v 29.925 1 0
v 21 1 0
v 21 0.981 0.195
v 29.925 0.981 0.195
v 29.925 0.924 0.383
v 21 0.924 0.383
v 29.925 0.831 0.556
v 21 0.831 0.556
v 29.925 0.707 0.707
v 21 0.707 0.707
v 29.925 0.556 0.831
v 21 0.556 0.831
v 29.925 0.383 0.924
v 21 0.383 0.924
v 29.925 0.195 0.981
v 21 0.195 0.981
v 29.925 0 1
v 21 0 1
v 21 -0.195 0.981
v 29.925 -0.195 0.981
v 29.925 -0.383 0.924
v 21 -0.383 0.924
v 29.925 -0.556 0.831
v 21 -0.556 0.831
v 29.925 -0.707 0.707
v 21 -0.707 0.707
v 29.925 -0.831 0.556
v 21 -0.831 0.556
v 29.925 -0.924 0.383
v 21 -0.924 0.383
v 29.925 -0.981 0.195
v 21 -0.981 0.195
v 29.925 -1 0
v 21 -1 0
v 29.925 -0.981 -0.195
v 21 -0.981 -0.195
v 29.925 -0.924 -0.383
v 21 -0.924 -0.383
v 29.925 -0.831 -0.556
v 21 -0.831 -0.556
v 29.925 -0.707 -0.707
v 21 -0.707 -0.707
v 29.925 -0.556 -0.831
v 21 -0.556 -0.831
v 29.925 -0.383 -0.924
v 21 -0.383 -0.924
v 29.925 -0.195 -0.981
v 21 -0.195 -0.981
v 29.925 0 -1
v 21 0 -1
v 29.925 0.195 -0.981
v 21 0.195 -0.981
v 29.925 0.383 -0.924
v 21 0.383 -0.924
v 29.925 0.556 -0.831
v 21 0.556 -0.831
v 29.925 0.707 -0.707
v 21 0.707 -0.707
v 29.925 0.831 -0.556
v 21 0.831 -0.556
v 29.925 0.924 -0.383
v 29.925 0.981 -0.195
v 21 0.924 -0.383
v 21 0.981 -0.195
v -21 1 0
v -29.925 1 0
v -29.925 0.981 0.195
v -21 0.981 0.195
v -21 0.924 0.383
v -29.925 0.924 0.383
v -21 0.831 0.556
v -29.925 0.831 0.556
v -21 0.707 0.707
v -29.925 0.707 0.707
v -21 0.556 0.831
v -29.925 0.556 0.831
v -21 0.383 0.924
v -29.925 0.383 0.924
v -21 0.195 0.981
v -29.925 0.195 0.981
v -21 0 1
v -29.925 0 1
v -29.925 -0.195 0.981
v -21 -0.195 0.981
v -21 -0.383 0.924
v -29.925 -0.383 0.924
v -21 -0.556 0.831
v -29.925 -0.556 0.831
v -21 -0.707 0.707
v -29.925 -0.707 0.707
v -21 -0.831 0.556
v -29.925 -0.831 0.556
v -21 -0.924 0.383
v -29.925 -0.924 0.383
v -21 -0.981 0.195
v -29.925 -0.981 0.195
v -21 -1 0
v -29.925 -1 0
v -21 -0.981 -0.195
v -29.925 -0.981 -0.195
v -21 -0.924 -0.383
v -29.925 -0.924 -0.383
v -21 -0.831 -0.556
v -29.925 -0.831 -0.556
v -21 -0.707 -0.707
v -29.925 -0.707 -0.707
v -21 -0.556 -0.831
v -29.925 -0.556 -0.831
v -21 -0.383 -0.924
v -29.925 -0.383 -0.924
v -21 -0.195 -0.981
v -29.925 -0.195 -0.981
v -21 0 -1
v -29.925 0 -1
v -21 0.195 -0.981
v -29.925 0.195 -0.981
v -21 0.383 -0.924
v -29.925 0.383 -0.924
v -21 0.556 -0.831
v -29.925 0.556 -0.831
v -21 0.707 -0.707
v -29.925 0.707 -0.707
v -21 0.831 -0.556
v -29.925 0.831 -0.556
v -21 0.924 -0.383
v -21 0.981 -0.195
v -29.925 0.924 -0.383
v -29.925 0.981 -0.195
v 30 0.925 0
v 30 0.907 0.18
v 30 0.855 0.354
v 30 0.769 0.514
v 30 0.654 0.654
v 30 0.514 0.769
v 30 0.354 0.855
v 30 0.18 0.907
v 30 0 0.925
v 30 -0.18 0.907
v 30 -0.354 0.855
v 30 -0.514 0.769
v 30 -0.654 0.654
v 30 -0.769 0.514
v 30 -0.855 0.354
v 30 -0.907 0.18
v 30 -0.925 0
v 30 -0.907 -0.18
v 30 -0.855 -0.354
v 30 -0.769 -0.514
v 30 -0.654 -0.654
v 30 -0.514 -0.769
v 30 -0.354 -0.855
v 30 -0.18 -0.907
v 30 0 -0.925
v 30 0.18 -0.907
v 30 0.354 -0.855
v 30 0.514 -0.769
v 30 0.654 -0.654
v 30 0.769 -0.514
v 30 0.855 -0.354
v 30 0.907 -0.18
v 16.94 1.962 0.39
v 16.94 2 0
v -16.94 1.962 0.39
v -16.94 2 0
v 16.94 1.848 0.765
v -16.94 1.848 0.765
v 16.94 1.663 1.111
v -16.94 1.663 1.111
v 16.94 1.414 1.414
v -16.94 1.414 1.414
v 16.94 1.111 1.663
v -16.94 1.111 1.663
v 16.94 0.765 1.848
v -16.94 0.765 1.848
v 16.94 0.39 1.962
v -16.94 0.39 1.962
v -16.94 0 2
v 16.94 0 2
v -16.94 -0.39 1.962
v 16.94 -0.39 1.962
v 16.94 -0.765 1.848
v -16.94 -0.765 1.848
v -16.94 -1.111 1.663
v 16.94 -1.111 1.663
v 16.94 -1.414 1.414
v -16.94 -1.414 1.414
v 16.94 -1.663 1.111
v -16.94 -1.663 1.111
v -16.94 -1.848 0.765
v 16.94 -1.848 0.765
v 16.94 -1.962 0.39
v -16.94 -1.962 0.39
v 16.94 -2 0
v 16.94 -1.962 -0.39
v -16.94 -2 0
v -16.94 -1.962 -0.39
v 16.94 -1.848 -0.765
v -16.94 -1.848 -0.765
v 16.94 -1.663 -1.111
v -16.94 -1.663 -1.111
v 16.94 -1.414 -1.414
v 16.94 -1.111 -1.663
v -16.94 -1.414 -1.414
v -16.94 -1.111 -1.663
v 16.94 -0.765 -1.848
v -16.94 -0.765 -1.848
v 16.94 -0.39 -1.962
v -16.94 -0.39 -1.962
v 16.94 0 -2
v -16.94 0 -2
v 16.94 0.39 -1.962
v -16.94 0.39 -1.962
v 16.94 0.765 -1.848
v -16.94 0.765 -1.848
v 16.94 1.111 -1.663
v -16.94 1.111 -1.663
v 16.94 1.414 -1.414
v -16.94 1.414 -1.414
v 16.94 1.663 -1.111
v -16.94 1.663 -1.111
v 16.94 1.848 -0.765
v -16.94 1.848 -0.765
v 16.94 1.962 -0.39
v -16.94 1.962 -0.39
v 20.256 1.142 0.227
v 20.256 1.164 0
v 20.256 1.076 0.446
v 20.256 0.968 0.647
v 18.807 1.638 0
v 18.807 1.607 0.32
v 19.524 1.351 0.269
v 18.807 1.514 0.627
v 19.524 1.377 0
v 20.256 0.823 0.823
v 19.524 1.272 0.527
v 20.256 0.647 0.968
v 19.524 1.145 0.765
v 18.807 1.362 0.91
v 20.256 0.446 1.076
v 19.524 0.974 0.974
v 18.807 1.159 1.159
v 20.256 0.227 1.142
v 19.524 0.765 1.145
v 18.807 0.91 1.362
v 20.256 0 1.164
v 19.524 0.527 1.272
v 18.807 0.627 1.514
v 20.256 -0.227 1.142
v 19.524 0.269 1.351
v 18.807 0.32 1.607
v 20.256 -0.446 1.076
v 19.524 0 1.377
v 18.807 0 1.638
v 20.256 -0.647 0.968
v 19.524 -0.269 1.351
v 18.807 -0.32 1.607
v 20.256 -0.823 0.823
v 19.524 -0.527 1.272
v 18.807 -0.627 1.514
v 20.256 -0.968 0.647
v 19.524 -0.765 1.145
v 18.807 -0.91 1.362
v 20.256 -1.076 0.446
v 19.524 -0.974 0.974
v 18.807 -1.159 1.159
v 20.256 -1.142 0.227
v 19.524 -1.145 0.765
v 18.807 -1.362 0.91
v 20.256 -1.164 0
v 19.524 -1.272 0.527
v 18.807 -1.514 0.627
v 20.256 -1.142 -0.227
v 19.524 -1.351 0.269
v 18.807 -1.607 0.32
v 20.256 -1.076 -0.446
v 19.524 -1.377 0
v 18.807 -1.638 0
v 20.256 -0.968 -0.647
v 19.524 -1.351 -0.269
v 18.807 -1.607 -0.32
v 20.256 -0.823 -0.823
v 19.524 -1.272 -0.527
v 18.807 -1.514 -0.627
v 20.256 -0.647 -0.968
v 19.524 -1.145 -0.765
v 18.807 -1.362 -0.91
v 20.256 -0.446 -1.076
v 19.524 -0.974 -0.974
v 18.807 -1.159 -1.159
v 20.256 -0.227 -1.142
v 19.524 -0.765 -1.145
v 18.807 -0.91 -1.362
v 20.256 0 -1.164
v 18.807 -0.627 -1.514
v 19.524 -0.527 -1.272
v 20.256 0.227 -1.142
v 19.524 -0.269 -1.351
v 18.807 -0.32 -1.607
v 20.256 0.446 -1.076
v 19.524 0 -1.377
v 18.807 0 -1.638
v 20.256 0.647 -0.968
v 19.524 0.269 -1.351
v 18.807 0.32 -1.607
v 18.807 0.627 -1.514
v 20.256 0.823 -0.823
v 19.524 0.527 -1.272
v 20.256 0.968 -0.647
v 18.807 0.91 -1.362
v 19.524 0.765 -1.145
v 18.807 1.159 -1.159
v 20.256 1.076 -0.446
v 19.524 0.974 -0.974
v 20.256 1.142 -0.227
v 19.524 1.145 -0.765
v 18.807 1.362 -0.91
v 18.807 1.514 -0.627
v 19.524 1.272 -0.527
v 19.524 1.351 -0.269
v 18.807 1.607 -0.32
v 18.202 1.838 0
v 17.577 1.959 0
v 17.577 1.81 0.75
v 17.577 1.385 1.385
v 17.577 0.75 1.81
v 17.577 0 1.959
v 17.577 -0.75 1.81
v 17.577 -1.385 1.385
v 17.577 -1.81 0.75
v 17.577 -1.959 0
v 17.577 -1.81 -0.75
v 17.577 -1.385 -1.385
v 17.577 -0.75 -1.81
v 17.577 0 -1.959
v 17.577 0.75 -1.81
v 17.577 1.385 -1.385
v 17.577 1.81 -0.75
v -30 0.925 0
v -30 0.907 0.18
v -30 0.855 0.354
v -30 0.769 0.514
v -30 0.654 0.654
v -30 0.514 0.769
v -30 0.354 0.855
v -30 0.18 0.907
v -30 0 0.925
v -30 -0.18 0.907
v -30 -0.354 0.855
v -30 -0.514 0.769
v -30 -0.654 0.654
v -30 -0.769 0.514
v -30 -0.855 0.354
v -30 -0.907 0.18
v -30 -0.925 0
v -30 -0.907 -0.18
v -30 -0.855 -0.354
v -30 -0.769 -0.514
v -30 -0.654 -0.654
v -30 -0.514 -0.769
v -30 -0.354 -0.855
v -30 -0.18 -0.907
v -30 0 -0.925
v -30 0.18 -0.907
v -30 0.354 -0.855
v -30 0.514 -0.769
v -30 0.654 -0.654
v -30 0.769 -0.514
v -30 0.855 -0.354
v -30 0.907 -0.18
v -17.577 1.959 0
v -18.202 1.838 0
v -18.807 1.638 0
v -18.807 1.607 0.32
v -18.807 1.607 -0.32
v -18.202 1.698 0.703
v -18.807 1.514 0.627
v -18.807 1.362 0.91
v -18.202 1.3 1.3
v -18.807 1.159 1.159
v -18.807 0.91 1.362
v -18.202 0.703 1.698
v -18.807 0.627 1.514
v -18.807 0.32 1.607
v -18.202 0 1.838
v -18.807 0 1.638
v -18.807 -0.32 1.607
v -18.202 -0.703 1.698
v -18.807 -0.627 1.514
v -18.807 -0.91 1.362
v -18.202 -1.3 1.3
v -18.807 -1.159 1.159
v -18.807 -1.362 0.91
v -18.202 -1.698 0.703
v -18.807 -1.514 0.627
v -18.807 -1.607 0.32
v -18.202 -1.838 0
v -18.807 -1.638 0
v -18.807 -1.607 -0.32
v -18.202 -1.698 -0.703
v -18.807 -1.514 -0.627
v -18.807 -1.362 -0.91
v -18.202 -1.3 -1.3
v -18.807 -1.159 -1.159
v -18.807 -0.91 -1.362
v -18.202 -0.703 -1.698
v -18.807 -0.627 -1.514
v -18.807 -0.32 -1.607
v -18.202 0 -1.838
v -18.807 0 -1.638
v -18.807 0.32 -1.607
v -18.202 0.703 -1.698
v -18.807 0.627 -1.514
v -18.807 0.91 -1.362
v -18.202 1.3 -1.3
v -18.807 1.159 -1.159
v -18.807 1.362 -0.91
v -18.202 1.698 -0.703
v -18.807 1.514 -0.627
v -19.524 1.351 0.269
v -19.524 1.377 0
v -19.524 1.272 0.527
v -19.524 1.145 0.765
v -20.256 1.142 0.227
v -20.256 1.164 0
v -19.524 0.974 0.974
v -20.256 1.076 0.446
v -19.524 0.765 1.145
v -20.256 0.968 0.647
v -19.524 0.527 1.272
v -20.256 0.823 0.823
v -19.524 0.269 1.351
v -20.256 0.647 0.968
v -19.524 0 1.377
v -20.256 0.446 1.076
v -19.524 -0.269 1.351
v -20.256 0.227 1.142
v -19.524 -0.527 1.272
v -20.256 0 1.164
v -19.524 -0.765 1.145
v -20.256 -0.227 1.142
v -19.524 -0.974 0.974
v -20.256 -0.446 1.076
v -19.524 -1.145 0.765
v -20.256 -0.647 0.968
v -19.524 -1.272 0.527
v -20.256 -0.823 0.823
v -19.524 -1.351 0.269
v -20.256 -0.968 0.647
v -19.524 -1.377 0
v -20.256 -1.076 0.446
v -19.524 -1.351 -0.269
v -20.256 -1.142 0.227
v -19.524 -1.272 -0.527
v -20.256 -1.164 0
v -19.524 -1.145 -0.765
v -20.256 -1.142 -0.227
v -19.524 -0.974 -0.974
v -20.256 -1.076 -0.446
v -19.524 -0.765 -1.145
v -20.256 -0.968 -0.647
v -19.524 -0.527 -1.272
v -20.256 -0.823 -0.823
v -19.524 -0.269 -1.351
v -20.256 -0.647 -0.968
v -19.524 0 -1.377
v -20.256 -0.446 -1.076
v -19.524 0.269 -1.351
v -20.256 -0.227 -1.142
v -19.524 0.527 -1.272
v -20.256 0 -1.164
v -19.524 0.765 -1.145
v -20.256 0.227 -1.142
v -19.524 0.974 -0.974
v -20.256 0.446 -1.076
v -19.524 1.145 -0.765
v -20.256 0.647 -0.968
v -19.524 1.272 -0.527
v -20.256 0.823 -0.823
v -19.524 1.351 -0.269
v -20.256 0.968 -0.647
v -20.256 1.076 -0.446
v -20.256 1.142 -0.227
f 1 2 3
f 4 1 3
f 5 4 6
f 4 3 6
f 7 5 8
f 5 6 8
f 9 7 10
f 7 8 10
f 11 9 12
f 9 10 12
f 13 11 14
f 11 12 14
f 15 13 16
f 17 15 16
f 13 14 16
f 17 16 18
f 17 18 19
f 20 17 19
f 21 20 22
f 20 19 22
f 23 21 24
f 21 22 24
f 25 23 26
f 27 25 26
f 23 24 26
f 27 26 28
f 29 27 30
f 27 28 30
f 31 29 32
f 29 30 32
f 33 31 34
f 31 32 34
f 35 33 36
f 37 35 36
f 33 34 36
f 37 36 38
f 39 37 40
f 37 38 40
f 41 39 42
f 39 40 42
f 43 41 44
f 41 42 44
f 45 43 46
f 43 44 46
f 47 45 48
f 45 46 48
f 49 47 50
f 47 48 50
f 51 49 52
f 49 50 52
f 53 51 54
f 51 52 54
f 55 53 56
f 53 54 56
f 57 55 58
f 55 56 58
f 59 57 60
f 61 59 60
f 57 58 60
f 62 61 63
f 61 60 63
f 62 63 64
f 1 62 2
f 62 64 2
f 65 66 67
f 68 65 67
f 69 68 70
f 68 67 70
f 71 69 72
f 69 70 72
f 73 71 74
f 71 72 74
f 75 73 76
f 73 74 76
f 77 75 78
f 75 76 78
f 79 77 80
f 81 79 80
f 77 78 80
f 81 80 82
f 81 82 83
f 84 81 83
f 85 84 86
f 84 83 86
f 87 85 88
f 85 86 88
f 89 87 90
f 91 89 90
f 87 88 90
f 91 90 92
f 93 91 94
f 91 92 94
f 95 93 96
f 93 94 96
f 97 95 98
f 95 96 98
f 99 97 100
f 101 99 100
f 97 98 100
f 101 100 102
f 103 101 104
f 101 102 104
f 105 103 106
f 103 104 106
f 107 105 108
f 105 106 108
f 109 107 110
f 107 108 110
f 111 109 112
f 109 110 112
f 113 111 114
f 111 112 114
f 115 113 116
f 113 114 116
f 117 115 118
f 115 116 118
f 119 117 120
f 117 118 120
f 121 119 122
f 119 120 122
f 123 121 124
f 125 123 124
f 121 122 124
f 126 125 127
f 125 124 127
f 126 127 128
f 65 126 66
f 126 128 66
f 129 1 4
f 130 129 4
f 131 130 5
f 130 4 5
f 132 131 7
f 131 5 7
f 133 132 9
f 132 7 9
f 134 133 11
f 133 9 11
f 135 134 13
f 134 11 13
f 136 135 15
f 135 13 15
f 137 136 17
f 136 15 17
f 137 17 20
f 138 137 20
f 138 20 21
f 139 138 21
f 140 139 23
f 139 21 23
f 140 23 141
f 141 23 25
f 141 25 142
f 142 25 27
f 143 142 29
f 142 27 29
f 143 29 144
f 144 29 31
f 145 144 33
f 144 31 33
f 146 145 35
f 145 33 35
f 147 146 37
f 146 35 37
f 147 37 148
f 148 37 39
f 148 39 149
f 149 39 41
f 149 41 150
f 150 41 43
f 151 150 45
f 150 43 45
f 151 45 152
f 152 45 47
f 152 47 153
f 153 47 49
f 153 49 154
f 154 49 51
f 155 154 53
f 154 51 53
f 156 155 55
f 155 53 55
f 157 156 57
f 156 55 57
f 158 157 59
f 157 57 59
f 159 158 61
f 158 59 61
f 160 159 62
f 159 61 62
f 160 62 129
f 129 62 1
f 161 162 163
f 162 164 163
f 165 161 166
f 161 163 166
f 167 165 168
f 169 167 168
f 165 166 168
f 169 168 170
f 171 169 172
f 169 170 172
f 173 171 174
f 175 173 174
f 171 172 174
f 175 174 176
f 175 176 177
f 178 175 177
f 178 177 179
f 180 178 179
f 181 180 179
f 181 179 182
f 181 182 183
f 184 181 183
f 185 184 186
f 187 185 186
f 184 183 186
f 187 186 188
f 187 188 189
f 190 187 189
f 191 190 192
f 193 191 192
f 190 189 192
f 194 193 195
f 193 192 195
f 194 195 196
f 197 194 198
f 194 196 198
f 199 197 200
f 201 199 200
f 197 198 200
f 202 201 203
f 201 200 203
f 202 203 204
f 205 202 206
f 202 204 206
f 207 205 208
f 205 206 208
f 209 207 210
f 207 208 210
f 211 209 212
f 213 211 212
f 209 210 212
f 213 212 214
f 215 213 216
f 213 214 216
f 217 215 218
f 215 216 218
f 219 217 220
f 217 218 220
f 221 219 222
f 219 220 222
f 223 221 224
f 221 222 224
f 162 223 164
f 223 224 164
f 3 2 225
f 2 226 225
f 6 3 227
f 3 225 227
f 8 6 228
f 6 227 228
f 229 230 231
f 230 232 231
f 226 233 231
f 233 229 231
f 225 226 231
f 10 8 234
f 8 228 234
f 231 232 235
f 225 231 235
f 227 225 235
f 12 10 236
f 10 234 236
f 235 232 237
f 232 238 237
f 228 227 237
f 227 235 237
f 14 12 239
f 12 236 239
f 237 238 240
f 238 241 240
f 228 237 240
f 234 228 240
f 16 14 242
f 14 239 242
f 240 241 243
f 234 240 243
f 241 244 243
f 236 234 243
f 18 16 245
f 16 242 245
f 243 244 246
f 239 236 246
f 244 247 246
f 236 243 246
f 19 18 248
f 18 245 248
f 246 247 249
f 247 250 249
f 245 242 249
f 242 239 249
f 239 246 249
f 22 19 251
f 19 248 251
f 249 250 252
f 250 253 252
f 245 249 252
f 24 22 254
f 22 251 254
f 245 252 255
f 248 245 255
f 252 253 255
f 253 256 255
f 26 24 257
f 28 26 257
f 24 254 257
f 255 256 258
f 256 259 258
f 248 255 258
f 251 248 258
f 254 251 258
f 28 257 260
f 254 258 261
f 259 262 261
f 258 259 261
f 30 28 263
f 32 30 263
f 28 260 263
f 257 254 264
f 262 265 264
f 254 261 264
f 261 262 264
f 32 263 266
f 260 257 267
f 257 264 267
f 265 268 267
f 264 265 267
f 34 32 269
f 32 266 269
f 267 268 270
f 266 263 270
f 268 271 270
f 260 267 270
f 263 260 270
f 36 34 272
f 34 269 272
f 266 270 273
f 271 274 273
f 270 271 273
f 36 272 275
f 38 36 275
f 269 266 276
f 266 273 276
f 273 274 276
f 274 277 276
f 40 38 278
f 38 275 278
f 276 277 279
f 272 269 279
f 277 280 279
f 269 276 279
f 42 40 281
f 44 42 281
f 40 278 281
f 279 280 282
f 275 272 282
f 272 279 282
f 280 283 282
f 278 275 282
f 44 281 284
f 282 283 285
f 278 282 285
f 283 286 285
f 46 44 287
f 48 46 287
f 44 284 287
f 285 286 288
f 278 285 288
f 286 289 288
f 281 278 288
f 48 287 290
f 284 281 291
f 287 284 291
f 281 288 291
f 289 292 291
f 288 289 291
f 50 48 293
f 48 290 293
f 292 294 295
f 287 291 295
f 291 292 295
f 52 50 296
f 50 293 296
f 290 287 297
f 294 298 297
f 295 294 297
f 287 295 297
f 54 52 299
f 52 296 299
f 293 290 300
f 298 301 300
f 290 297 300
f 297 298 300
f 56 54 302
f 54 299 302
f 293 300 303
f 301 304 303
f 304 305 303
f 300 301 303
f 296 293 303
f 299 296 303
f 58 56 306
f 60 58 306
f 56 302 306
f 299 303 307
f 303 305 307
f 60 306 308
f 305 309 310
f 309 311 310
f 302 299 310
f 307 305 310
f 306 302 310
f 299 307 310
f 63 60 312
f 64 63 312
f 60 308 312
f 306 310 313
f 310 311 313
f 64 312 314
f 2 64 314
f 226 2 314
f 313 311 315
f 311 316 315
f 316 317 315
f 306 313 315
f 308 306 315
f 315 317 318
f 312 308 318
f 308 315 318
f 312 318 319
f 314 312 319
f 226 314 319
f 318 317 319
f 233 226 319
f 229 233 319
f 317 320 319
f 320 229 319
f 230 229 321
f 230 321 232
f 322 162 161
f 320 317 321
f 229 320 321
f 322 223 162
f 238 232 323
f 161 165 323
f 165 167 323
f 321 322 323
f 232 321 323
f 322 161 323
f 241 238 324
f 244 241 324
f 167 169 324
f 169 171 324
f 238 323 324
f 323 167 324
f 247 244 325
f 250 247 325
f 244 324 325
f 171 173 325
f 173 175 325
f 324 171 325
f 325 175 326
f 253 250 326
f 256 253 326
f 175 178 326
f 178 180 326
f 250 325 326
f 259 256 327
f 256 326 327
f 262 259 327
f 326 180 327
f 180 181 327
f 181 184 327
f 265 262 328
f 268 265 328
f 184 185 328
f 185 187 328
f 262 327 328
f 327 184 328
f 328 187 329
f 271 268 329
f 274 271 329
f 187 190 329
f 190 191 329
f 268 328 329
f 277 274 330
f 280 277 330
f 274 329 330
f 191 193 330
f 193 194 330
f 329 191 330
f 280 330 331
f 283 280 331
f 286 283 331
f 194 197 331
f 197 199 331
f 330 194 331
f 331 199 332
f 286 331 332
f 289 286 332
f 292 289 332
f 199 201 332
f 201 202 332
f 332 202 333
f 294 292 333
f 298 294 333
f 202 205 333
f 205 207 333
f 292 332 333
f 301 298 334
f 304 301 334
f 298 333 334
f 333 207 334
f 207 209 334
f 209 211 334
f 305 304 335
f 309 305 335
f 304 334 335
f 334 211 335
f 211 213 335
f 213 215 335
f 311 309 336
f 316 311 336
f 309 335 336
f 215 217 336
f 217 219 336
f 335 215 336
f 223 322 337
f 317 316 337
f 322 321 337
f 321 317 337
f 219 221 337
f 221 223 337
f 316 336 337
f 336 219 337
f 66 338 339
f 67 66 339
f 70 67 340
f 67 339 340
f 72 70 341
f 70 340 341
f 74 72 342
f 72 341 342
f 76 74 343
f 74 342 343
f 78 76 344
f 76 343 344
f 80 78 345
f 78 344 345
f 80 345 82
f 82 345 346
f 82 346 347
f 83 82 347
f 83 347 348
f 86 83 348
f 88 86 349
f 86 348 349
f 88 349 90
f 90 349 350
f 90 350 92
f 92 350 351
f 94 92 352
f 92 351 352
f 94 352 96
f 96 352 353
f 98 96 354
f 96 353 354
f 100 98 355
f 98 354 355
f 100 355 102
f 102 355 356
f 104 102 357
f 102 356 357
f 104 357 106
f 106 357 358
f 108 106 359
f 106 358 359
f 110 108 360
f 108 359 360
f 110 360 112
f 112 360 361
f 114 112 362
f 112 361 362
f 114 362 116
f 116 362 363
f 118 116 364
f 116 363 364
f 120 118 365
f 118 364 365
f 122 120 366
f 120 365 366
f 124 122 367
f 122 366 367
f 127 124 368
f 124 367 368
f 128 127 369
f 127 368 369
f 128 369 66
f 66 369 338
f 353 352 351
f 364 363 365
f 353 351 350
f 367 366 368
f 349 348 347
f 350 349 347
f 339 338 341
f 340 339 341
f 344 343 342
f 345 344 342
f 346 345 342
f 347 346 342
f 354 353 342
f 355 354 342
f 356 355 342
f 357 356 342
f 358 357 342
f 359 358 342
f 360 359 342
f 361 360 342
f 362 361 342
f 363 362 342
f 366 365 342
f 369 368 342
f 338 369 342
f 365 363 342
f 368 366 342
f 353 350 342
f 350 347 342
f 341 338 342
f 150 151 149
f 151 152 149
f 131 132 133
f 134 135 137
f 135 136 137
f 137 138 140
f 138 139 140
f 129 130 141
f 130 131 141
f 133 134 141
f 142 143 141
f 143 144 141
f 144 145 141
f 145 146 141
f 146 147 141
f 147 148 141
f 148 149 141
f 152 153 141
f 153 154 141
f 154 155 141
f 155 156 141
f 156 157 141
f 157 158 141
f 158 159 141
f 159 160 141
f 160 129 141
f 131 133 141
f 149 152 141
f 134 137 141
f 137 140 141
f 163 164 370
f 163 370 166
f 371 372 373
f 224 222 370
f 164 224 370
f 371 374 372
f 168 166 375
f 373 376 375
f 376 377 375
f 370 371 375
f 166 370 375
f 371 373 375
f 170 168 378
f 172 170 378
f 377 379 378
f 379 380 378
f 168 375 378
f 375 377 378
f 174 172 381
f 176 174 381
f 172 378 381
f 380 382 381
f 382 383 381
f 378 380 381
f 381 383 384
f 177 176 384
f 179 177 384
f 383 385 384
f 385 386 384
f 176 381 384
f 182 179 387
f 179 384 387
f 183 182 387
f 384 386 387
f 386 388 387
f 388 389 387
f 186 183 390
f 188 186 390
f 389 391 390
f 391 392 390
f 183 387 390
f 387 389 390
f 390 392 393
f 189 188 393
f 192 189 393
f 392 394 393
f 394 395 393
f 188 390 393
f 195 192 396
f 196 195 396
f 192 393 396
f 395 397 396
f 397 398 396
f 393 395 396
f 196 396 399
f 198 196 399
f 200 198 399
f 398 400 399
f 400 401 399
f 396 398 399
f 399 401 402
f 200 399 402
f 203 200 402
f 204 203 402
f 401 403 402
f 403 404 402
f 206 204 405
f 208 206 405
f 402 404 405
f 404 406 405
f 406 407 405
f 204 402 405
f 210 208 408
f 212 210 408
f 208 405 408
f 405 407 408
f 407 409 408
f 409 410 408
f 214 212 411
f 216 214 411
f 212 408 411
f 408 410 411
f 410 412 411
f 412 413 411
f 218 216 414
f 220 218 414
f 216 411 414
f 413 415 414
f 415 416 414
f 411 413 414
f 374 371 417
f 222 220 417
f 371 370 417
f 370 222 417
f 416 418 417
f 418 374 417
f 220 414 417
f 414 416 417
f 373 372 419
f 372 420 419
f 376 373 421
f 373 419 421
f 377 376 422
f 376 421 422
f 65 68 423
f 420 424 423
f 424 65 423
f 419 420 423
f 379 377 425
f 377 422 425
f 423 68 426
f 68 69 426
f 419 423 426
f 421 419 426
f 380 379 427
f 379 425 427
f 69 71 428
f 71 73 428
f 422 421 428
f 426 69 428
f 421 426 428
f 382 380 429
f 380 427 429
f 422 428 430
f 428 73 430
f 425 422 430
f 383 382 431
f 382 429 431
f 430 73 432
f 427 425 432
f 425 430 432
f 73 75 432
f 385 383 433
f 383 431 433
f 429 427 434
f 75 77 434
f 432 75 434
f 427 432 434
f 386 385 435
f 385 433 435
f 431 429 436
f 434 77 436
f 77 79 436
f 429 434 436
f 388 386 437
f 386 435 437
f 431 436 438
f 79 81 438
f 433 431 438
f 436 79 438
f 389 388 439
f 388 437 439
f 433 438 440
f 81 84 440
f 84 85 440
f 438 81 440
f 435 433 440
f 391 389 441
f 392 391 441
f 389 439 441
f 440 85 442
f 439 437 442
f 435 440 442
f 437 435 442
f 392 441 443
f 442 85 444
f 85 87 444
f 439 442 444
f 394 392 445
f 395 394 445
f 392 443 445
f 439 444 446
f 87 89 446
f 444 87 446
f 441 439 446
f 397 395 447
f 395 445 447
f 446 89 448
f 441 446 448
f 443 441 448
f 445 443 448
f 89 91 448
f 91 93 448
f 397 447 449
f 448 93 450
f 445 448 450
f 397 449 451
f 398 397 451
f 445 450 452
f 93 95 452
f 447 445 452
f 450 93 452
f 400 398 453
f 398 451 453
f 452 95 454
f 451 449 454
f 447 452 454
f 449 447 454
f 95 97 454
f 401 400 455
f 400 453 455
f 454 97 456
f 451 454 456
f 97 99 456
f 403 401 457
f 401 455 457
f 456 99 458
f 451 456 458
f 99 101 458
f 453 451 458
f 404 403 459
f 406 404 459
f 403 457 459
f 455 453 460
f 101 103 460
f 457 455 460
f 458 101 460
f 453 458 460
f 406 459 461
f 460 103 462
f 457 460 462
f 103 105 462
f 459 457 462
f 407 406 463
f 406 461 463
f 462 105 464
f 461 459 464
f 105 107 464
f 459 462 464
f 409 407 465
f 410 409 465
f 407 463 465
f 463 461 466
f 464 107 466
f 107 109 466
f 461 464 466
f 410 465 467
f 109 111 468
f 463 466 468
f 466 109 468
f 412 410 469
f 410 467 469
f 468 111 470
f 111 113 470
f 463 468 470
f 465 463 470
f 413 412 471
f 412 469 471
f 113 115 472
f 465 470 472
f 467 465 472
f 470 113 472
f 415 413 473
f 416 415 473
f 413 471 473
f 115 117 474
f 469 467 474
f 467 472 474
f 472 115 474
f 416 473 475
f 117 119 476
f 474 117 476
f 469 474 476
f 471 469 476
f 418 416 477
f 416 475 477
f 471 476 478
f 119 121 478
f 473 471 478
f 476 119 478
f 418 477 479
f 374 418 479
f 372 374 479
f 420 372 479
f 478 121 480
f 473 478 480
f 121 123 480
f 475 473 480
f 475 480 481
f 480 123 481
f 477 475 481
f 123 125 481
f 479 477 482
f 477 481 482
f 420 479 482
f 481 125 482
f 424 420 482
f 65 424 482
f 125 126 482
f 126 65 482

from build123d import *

# Parameters (mm, degrees)
CHAMFER1_SIZE = 0.075


with BuildPart() as part:
    # Sketch2 → Revolve1 (revolve)
    with BuildSketch(Plane.XY):
        with BuildLine():
            Line((-30, 0), (30, 0))
            Line((30, 0), (30, 1))
            Line((30, 1), (21, 1))
            ThreePointArc((21, 1), (19.887839476, 1.264702229), (18.807410064, 1.638387373))
            ThreePointArc((18.807410064, 1.638387373), (17.891303231, 1.908764451), (16.940497485, 2))
            Line((16.940497485, 2), (-16.940497485, 2))
            ThreePointArc((-16.940497485, 2), (-17.891303231, 1.908764451), (-18.807410064, 1.638387373))
            ThreePointArc((-18.807410064, 1.638387373), (-19.887839476, 1.264702229), (-21, 1))
            Line((-21, 1), (-30, 1))
            Line((-30, 1), (-30, 0))
        make_face()
    revolve(axis=Axis((-30, 0, 0), (1, 0, 0)))

    # Chamfer1
    chamfer1_edges = [part.edges().sort_by_distance(p)[0] for p in [
        (30, -1, 0),
        (-30, -1, 0),
    ]]
    chamfer(chamfer1_edges, length=CHAMFER1_SIZE)


solid = part.part
